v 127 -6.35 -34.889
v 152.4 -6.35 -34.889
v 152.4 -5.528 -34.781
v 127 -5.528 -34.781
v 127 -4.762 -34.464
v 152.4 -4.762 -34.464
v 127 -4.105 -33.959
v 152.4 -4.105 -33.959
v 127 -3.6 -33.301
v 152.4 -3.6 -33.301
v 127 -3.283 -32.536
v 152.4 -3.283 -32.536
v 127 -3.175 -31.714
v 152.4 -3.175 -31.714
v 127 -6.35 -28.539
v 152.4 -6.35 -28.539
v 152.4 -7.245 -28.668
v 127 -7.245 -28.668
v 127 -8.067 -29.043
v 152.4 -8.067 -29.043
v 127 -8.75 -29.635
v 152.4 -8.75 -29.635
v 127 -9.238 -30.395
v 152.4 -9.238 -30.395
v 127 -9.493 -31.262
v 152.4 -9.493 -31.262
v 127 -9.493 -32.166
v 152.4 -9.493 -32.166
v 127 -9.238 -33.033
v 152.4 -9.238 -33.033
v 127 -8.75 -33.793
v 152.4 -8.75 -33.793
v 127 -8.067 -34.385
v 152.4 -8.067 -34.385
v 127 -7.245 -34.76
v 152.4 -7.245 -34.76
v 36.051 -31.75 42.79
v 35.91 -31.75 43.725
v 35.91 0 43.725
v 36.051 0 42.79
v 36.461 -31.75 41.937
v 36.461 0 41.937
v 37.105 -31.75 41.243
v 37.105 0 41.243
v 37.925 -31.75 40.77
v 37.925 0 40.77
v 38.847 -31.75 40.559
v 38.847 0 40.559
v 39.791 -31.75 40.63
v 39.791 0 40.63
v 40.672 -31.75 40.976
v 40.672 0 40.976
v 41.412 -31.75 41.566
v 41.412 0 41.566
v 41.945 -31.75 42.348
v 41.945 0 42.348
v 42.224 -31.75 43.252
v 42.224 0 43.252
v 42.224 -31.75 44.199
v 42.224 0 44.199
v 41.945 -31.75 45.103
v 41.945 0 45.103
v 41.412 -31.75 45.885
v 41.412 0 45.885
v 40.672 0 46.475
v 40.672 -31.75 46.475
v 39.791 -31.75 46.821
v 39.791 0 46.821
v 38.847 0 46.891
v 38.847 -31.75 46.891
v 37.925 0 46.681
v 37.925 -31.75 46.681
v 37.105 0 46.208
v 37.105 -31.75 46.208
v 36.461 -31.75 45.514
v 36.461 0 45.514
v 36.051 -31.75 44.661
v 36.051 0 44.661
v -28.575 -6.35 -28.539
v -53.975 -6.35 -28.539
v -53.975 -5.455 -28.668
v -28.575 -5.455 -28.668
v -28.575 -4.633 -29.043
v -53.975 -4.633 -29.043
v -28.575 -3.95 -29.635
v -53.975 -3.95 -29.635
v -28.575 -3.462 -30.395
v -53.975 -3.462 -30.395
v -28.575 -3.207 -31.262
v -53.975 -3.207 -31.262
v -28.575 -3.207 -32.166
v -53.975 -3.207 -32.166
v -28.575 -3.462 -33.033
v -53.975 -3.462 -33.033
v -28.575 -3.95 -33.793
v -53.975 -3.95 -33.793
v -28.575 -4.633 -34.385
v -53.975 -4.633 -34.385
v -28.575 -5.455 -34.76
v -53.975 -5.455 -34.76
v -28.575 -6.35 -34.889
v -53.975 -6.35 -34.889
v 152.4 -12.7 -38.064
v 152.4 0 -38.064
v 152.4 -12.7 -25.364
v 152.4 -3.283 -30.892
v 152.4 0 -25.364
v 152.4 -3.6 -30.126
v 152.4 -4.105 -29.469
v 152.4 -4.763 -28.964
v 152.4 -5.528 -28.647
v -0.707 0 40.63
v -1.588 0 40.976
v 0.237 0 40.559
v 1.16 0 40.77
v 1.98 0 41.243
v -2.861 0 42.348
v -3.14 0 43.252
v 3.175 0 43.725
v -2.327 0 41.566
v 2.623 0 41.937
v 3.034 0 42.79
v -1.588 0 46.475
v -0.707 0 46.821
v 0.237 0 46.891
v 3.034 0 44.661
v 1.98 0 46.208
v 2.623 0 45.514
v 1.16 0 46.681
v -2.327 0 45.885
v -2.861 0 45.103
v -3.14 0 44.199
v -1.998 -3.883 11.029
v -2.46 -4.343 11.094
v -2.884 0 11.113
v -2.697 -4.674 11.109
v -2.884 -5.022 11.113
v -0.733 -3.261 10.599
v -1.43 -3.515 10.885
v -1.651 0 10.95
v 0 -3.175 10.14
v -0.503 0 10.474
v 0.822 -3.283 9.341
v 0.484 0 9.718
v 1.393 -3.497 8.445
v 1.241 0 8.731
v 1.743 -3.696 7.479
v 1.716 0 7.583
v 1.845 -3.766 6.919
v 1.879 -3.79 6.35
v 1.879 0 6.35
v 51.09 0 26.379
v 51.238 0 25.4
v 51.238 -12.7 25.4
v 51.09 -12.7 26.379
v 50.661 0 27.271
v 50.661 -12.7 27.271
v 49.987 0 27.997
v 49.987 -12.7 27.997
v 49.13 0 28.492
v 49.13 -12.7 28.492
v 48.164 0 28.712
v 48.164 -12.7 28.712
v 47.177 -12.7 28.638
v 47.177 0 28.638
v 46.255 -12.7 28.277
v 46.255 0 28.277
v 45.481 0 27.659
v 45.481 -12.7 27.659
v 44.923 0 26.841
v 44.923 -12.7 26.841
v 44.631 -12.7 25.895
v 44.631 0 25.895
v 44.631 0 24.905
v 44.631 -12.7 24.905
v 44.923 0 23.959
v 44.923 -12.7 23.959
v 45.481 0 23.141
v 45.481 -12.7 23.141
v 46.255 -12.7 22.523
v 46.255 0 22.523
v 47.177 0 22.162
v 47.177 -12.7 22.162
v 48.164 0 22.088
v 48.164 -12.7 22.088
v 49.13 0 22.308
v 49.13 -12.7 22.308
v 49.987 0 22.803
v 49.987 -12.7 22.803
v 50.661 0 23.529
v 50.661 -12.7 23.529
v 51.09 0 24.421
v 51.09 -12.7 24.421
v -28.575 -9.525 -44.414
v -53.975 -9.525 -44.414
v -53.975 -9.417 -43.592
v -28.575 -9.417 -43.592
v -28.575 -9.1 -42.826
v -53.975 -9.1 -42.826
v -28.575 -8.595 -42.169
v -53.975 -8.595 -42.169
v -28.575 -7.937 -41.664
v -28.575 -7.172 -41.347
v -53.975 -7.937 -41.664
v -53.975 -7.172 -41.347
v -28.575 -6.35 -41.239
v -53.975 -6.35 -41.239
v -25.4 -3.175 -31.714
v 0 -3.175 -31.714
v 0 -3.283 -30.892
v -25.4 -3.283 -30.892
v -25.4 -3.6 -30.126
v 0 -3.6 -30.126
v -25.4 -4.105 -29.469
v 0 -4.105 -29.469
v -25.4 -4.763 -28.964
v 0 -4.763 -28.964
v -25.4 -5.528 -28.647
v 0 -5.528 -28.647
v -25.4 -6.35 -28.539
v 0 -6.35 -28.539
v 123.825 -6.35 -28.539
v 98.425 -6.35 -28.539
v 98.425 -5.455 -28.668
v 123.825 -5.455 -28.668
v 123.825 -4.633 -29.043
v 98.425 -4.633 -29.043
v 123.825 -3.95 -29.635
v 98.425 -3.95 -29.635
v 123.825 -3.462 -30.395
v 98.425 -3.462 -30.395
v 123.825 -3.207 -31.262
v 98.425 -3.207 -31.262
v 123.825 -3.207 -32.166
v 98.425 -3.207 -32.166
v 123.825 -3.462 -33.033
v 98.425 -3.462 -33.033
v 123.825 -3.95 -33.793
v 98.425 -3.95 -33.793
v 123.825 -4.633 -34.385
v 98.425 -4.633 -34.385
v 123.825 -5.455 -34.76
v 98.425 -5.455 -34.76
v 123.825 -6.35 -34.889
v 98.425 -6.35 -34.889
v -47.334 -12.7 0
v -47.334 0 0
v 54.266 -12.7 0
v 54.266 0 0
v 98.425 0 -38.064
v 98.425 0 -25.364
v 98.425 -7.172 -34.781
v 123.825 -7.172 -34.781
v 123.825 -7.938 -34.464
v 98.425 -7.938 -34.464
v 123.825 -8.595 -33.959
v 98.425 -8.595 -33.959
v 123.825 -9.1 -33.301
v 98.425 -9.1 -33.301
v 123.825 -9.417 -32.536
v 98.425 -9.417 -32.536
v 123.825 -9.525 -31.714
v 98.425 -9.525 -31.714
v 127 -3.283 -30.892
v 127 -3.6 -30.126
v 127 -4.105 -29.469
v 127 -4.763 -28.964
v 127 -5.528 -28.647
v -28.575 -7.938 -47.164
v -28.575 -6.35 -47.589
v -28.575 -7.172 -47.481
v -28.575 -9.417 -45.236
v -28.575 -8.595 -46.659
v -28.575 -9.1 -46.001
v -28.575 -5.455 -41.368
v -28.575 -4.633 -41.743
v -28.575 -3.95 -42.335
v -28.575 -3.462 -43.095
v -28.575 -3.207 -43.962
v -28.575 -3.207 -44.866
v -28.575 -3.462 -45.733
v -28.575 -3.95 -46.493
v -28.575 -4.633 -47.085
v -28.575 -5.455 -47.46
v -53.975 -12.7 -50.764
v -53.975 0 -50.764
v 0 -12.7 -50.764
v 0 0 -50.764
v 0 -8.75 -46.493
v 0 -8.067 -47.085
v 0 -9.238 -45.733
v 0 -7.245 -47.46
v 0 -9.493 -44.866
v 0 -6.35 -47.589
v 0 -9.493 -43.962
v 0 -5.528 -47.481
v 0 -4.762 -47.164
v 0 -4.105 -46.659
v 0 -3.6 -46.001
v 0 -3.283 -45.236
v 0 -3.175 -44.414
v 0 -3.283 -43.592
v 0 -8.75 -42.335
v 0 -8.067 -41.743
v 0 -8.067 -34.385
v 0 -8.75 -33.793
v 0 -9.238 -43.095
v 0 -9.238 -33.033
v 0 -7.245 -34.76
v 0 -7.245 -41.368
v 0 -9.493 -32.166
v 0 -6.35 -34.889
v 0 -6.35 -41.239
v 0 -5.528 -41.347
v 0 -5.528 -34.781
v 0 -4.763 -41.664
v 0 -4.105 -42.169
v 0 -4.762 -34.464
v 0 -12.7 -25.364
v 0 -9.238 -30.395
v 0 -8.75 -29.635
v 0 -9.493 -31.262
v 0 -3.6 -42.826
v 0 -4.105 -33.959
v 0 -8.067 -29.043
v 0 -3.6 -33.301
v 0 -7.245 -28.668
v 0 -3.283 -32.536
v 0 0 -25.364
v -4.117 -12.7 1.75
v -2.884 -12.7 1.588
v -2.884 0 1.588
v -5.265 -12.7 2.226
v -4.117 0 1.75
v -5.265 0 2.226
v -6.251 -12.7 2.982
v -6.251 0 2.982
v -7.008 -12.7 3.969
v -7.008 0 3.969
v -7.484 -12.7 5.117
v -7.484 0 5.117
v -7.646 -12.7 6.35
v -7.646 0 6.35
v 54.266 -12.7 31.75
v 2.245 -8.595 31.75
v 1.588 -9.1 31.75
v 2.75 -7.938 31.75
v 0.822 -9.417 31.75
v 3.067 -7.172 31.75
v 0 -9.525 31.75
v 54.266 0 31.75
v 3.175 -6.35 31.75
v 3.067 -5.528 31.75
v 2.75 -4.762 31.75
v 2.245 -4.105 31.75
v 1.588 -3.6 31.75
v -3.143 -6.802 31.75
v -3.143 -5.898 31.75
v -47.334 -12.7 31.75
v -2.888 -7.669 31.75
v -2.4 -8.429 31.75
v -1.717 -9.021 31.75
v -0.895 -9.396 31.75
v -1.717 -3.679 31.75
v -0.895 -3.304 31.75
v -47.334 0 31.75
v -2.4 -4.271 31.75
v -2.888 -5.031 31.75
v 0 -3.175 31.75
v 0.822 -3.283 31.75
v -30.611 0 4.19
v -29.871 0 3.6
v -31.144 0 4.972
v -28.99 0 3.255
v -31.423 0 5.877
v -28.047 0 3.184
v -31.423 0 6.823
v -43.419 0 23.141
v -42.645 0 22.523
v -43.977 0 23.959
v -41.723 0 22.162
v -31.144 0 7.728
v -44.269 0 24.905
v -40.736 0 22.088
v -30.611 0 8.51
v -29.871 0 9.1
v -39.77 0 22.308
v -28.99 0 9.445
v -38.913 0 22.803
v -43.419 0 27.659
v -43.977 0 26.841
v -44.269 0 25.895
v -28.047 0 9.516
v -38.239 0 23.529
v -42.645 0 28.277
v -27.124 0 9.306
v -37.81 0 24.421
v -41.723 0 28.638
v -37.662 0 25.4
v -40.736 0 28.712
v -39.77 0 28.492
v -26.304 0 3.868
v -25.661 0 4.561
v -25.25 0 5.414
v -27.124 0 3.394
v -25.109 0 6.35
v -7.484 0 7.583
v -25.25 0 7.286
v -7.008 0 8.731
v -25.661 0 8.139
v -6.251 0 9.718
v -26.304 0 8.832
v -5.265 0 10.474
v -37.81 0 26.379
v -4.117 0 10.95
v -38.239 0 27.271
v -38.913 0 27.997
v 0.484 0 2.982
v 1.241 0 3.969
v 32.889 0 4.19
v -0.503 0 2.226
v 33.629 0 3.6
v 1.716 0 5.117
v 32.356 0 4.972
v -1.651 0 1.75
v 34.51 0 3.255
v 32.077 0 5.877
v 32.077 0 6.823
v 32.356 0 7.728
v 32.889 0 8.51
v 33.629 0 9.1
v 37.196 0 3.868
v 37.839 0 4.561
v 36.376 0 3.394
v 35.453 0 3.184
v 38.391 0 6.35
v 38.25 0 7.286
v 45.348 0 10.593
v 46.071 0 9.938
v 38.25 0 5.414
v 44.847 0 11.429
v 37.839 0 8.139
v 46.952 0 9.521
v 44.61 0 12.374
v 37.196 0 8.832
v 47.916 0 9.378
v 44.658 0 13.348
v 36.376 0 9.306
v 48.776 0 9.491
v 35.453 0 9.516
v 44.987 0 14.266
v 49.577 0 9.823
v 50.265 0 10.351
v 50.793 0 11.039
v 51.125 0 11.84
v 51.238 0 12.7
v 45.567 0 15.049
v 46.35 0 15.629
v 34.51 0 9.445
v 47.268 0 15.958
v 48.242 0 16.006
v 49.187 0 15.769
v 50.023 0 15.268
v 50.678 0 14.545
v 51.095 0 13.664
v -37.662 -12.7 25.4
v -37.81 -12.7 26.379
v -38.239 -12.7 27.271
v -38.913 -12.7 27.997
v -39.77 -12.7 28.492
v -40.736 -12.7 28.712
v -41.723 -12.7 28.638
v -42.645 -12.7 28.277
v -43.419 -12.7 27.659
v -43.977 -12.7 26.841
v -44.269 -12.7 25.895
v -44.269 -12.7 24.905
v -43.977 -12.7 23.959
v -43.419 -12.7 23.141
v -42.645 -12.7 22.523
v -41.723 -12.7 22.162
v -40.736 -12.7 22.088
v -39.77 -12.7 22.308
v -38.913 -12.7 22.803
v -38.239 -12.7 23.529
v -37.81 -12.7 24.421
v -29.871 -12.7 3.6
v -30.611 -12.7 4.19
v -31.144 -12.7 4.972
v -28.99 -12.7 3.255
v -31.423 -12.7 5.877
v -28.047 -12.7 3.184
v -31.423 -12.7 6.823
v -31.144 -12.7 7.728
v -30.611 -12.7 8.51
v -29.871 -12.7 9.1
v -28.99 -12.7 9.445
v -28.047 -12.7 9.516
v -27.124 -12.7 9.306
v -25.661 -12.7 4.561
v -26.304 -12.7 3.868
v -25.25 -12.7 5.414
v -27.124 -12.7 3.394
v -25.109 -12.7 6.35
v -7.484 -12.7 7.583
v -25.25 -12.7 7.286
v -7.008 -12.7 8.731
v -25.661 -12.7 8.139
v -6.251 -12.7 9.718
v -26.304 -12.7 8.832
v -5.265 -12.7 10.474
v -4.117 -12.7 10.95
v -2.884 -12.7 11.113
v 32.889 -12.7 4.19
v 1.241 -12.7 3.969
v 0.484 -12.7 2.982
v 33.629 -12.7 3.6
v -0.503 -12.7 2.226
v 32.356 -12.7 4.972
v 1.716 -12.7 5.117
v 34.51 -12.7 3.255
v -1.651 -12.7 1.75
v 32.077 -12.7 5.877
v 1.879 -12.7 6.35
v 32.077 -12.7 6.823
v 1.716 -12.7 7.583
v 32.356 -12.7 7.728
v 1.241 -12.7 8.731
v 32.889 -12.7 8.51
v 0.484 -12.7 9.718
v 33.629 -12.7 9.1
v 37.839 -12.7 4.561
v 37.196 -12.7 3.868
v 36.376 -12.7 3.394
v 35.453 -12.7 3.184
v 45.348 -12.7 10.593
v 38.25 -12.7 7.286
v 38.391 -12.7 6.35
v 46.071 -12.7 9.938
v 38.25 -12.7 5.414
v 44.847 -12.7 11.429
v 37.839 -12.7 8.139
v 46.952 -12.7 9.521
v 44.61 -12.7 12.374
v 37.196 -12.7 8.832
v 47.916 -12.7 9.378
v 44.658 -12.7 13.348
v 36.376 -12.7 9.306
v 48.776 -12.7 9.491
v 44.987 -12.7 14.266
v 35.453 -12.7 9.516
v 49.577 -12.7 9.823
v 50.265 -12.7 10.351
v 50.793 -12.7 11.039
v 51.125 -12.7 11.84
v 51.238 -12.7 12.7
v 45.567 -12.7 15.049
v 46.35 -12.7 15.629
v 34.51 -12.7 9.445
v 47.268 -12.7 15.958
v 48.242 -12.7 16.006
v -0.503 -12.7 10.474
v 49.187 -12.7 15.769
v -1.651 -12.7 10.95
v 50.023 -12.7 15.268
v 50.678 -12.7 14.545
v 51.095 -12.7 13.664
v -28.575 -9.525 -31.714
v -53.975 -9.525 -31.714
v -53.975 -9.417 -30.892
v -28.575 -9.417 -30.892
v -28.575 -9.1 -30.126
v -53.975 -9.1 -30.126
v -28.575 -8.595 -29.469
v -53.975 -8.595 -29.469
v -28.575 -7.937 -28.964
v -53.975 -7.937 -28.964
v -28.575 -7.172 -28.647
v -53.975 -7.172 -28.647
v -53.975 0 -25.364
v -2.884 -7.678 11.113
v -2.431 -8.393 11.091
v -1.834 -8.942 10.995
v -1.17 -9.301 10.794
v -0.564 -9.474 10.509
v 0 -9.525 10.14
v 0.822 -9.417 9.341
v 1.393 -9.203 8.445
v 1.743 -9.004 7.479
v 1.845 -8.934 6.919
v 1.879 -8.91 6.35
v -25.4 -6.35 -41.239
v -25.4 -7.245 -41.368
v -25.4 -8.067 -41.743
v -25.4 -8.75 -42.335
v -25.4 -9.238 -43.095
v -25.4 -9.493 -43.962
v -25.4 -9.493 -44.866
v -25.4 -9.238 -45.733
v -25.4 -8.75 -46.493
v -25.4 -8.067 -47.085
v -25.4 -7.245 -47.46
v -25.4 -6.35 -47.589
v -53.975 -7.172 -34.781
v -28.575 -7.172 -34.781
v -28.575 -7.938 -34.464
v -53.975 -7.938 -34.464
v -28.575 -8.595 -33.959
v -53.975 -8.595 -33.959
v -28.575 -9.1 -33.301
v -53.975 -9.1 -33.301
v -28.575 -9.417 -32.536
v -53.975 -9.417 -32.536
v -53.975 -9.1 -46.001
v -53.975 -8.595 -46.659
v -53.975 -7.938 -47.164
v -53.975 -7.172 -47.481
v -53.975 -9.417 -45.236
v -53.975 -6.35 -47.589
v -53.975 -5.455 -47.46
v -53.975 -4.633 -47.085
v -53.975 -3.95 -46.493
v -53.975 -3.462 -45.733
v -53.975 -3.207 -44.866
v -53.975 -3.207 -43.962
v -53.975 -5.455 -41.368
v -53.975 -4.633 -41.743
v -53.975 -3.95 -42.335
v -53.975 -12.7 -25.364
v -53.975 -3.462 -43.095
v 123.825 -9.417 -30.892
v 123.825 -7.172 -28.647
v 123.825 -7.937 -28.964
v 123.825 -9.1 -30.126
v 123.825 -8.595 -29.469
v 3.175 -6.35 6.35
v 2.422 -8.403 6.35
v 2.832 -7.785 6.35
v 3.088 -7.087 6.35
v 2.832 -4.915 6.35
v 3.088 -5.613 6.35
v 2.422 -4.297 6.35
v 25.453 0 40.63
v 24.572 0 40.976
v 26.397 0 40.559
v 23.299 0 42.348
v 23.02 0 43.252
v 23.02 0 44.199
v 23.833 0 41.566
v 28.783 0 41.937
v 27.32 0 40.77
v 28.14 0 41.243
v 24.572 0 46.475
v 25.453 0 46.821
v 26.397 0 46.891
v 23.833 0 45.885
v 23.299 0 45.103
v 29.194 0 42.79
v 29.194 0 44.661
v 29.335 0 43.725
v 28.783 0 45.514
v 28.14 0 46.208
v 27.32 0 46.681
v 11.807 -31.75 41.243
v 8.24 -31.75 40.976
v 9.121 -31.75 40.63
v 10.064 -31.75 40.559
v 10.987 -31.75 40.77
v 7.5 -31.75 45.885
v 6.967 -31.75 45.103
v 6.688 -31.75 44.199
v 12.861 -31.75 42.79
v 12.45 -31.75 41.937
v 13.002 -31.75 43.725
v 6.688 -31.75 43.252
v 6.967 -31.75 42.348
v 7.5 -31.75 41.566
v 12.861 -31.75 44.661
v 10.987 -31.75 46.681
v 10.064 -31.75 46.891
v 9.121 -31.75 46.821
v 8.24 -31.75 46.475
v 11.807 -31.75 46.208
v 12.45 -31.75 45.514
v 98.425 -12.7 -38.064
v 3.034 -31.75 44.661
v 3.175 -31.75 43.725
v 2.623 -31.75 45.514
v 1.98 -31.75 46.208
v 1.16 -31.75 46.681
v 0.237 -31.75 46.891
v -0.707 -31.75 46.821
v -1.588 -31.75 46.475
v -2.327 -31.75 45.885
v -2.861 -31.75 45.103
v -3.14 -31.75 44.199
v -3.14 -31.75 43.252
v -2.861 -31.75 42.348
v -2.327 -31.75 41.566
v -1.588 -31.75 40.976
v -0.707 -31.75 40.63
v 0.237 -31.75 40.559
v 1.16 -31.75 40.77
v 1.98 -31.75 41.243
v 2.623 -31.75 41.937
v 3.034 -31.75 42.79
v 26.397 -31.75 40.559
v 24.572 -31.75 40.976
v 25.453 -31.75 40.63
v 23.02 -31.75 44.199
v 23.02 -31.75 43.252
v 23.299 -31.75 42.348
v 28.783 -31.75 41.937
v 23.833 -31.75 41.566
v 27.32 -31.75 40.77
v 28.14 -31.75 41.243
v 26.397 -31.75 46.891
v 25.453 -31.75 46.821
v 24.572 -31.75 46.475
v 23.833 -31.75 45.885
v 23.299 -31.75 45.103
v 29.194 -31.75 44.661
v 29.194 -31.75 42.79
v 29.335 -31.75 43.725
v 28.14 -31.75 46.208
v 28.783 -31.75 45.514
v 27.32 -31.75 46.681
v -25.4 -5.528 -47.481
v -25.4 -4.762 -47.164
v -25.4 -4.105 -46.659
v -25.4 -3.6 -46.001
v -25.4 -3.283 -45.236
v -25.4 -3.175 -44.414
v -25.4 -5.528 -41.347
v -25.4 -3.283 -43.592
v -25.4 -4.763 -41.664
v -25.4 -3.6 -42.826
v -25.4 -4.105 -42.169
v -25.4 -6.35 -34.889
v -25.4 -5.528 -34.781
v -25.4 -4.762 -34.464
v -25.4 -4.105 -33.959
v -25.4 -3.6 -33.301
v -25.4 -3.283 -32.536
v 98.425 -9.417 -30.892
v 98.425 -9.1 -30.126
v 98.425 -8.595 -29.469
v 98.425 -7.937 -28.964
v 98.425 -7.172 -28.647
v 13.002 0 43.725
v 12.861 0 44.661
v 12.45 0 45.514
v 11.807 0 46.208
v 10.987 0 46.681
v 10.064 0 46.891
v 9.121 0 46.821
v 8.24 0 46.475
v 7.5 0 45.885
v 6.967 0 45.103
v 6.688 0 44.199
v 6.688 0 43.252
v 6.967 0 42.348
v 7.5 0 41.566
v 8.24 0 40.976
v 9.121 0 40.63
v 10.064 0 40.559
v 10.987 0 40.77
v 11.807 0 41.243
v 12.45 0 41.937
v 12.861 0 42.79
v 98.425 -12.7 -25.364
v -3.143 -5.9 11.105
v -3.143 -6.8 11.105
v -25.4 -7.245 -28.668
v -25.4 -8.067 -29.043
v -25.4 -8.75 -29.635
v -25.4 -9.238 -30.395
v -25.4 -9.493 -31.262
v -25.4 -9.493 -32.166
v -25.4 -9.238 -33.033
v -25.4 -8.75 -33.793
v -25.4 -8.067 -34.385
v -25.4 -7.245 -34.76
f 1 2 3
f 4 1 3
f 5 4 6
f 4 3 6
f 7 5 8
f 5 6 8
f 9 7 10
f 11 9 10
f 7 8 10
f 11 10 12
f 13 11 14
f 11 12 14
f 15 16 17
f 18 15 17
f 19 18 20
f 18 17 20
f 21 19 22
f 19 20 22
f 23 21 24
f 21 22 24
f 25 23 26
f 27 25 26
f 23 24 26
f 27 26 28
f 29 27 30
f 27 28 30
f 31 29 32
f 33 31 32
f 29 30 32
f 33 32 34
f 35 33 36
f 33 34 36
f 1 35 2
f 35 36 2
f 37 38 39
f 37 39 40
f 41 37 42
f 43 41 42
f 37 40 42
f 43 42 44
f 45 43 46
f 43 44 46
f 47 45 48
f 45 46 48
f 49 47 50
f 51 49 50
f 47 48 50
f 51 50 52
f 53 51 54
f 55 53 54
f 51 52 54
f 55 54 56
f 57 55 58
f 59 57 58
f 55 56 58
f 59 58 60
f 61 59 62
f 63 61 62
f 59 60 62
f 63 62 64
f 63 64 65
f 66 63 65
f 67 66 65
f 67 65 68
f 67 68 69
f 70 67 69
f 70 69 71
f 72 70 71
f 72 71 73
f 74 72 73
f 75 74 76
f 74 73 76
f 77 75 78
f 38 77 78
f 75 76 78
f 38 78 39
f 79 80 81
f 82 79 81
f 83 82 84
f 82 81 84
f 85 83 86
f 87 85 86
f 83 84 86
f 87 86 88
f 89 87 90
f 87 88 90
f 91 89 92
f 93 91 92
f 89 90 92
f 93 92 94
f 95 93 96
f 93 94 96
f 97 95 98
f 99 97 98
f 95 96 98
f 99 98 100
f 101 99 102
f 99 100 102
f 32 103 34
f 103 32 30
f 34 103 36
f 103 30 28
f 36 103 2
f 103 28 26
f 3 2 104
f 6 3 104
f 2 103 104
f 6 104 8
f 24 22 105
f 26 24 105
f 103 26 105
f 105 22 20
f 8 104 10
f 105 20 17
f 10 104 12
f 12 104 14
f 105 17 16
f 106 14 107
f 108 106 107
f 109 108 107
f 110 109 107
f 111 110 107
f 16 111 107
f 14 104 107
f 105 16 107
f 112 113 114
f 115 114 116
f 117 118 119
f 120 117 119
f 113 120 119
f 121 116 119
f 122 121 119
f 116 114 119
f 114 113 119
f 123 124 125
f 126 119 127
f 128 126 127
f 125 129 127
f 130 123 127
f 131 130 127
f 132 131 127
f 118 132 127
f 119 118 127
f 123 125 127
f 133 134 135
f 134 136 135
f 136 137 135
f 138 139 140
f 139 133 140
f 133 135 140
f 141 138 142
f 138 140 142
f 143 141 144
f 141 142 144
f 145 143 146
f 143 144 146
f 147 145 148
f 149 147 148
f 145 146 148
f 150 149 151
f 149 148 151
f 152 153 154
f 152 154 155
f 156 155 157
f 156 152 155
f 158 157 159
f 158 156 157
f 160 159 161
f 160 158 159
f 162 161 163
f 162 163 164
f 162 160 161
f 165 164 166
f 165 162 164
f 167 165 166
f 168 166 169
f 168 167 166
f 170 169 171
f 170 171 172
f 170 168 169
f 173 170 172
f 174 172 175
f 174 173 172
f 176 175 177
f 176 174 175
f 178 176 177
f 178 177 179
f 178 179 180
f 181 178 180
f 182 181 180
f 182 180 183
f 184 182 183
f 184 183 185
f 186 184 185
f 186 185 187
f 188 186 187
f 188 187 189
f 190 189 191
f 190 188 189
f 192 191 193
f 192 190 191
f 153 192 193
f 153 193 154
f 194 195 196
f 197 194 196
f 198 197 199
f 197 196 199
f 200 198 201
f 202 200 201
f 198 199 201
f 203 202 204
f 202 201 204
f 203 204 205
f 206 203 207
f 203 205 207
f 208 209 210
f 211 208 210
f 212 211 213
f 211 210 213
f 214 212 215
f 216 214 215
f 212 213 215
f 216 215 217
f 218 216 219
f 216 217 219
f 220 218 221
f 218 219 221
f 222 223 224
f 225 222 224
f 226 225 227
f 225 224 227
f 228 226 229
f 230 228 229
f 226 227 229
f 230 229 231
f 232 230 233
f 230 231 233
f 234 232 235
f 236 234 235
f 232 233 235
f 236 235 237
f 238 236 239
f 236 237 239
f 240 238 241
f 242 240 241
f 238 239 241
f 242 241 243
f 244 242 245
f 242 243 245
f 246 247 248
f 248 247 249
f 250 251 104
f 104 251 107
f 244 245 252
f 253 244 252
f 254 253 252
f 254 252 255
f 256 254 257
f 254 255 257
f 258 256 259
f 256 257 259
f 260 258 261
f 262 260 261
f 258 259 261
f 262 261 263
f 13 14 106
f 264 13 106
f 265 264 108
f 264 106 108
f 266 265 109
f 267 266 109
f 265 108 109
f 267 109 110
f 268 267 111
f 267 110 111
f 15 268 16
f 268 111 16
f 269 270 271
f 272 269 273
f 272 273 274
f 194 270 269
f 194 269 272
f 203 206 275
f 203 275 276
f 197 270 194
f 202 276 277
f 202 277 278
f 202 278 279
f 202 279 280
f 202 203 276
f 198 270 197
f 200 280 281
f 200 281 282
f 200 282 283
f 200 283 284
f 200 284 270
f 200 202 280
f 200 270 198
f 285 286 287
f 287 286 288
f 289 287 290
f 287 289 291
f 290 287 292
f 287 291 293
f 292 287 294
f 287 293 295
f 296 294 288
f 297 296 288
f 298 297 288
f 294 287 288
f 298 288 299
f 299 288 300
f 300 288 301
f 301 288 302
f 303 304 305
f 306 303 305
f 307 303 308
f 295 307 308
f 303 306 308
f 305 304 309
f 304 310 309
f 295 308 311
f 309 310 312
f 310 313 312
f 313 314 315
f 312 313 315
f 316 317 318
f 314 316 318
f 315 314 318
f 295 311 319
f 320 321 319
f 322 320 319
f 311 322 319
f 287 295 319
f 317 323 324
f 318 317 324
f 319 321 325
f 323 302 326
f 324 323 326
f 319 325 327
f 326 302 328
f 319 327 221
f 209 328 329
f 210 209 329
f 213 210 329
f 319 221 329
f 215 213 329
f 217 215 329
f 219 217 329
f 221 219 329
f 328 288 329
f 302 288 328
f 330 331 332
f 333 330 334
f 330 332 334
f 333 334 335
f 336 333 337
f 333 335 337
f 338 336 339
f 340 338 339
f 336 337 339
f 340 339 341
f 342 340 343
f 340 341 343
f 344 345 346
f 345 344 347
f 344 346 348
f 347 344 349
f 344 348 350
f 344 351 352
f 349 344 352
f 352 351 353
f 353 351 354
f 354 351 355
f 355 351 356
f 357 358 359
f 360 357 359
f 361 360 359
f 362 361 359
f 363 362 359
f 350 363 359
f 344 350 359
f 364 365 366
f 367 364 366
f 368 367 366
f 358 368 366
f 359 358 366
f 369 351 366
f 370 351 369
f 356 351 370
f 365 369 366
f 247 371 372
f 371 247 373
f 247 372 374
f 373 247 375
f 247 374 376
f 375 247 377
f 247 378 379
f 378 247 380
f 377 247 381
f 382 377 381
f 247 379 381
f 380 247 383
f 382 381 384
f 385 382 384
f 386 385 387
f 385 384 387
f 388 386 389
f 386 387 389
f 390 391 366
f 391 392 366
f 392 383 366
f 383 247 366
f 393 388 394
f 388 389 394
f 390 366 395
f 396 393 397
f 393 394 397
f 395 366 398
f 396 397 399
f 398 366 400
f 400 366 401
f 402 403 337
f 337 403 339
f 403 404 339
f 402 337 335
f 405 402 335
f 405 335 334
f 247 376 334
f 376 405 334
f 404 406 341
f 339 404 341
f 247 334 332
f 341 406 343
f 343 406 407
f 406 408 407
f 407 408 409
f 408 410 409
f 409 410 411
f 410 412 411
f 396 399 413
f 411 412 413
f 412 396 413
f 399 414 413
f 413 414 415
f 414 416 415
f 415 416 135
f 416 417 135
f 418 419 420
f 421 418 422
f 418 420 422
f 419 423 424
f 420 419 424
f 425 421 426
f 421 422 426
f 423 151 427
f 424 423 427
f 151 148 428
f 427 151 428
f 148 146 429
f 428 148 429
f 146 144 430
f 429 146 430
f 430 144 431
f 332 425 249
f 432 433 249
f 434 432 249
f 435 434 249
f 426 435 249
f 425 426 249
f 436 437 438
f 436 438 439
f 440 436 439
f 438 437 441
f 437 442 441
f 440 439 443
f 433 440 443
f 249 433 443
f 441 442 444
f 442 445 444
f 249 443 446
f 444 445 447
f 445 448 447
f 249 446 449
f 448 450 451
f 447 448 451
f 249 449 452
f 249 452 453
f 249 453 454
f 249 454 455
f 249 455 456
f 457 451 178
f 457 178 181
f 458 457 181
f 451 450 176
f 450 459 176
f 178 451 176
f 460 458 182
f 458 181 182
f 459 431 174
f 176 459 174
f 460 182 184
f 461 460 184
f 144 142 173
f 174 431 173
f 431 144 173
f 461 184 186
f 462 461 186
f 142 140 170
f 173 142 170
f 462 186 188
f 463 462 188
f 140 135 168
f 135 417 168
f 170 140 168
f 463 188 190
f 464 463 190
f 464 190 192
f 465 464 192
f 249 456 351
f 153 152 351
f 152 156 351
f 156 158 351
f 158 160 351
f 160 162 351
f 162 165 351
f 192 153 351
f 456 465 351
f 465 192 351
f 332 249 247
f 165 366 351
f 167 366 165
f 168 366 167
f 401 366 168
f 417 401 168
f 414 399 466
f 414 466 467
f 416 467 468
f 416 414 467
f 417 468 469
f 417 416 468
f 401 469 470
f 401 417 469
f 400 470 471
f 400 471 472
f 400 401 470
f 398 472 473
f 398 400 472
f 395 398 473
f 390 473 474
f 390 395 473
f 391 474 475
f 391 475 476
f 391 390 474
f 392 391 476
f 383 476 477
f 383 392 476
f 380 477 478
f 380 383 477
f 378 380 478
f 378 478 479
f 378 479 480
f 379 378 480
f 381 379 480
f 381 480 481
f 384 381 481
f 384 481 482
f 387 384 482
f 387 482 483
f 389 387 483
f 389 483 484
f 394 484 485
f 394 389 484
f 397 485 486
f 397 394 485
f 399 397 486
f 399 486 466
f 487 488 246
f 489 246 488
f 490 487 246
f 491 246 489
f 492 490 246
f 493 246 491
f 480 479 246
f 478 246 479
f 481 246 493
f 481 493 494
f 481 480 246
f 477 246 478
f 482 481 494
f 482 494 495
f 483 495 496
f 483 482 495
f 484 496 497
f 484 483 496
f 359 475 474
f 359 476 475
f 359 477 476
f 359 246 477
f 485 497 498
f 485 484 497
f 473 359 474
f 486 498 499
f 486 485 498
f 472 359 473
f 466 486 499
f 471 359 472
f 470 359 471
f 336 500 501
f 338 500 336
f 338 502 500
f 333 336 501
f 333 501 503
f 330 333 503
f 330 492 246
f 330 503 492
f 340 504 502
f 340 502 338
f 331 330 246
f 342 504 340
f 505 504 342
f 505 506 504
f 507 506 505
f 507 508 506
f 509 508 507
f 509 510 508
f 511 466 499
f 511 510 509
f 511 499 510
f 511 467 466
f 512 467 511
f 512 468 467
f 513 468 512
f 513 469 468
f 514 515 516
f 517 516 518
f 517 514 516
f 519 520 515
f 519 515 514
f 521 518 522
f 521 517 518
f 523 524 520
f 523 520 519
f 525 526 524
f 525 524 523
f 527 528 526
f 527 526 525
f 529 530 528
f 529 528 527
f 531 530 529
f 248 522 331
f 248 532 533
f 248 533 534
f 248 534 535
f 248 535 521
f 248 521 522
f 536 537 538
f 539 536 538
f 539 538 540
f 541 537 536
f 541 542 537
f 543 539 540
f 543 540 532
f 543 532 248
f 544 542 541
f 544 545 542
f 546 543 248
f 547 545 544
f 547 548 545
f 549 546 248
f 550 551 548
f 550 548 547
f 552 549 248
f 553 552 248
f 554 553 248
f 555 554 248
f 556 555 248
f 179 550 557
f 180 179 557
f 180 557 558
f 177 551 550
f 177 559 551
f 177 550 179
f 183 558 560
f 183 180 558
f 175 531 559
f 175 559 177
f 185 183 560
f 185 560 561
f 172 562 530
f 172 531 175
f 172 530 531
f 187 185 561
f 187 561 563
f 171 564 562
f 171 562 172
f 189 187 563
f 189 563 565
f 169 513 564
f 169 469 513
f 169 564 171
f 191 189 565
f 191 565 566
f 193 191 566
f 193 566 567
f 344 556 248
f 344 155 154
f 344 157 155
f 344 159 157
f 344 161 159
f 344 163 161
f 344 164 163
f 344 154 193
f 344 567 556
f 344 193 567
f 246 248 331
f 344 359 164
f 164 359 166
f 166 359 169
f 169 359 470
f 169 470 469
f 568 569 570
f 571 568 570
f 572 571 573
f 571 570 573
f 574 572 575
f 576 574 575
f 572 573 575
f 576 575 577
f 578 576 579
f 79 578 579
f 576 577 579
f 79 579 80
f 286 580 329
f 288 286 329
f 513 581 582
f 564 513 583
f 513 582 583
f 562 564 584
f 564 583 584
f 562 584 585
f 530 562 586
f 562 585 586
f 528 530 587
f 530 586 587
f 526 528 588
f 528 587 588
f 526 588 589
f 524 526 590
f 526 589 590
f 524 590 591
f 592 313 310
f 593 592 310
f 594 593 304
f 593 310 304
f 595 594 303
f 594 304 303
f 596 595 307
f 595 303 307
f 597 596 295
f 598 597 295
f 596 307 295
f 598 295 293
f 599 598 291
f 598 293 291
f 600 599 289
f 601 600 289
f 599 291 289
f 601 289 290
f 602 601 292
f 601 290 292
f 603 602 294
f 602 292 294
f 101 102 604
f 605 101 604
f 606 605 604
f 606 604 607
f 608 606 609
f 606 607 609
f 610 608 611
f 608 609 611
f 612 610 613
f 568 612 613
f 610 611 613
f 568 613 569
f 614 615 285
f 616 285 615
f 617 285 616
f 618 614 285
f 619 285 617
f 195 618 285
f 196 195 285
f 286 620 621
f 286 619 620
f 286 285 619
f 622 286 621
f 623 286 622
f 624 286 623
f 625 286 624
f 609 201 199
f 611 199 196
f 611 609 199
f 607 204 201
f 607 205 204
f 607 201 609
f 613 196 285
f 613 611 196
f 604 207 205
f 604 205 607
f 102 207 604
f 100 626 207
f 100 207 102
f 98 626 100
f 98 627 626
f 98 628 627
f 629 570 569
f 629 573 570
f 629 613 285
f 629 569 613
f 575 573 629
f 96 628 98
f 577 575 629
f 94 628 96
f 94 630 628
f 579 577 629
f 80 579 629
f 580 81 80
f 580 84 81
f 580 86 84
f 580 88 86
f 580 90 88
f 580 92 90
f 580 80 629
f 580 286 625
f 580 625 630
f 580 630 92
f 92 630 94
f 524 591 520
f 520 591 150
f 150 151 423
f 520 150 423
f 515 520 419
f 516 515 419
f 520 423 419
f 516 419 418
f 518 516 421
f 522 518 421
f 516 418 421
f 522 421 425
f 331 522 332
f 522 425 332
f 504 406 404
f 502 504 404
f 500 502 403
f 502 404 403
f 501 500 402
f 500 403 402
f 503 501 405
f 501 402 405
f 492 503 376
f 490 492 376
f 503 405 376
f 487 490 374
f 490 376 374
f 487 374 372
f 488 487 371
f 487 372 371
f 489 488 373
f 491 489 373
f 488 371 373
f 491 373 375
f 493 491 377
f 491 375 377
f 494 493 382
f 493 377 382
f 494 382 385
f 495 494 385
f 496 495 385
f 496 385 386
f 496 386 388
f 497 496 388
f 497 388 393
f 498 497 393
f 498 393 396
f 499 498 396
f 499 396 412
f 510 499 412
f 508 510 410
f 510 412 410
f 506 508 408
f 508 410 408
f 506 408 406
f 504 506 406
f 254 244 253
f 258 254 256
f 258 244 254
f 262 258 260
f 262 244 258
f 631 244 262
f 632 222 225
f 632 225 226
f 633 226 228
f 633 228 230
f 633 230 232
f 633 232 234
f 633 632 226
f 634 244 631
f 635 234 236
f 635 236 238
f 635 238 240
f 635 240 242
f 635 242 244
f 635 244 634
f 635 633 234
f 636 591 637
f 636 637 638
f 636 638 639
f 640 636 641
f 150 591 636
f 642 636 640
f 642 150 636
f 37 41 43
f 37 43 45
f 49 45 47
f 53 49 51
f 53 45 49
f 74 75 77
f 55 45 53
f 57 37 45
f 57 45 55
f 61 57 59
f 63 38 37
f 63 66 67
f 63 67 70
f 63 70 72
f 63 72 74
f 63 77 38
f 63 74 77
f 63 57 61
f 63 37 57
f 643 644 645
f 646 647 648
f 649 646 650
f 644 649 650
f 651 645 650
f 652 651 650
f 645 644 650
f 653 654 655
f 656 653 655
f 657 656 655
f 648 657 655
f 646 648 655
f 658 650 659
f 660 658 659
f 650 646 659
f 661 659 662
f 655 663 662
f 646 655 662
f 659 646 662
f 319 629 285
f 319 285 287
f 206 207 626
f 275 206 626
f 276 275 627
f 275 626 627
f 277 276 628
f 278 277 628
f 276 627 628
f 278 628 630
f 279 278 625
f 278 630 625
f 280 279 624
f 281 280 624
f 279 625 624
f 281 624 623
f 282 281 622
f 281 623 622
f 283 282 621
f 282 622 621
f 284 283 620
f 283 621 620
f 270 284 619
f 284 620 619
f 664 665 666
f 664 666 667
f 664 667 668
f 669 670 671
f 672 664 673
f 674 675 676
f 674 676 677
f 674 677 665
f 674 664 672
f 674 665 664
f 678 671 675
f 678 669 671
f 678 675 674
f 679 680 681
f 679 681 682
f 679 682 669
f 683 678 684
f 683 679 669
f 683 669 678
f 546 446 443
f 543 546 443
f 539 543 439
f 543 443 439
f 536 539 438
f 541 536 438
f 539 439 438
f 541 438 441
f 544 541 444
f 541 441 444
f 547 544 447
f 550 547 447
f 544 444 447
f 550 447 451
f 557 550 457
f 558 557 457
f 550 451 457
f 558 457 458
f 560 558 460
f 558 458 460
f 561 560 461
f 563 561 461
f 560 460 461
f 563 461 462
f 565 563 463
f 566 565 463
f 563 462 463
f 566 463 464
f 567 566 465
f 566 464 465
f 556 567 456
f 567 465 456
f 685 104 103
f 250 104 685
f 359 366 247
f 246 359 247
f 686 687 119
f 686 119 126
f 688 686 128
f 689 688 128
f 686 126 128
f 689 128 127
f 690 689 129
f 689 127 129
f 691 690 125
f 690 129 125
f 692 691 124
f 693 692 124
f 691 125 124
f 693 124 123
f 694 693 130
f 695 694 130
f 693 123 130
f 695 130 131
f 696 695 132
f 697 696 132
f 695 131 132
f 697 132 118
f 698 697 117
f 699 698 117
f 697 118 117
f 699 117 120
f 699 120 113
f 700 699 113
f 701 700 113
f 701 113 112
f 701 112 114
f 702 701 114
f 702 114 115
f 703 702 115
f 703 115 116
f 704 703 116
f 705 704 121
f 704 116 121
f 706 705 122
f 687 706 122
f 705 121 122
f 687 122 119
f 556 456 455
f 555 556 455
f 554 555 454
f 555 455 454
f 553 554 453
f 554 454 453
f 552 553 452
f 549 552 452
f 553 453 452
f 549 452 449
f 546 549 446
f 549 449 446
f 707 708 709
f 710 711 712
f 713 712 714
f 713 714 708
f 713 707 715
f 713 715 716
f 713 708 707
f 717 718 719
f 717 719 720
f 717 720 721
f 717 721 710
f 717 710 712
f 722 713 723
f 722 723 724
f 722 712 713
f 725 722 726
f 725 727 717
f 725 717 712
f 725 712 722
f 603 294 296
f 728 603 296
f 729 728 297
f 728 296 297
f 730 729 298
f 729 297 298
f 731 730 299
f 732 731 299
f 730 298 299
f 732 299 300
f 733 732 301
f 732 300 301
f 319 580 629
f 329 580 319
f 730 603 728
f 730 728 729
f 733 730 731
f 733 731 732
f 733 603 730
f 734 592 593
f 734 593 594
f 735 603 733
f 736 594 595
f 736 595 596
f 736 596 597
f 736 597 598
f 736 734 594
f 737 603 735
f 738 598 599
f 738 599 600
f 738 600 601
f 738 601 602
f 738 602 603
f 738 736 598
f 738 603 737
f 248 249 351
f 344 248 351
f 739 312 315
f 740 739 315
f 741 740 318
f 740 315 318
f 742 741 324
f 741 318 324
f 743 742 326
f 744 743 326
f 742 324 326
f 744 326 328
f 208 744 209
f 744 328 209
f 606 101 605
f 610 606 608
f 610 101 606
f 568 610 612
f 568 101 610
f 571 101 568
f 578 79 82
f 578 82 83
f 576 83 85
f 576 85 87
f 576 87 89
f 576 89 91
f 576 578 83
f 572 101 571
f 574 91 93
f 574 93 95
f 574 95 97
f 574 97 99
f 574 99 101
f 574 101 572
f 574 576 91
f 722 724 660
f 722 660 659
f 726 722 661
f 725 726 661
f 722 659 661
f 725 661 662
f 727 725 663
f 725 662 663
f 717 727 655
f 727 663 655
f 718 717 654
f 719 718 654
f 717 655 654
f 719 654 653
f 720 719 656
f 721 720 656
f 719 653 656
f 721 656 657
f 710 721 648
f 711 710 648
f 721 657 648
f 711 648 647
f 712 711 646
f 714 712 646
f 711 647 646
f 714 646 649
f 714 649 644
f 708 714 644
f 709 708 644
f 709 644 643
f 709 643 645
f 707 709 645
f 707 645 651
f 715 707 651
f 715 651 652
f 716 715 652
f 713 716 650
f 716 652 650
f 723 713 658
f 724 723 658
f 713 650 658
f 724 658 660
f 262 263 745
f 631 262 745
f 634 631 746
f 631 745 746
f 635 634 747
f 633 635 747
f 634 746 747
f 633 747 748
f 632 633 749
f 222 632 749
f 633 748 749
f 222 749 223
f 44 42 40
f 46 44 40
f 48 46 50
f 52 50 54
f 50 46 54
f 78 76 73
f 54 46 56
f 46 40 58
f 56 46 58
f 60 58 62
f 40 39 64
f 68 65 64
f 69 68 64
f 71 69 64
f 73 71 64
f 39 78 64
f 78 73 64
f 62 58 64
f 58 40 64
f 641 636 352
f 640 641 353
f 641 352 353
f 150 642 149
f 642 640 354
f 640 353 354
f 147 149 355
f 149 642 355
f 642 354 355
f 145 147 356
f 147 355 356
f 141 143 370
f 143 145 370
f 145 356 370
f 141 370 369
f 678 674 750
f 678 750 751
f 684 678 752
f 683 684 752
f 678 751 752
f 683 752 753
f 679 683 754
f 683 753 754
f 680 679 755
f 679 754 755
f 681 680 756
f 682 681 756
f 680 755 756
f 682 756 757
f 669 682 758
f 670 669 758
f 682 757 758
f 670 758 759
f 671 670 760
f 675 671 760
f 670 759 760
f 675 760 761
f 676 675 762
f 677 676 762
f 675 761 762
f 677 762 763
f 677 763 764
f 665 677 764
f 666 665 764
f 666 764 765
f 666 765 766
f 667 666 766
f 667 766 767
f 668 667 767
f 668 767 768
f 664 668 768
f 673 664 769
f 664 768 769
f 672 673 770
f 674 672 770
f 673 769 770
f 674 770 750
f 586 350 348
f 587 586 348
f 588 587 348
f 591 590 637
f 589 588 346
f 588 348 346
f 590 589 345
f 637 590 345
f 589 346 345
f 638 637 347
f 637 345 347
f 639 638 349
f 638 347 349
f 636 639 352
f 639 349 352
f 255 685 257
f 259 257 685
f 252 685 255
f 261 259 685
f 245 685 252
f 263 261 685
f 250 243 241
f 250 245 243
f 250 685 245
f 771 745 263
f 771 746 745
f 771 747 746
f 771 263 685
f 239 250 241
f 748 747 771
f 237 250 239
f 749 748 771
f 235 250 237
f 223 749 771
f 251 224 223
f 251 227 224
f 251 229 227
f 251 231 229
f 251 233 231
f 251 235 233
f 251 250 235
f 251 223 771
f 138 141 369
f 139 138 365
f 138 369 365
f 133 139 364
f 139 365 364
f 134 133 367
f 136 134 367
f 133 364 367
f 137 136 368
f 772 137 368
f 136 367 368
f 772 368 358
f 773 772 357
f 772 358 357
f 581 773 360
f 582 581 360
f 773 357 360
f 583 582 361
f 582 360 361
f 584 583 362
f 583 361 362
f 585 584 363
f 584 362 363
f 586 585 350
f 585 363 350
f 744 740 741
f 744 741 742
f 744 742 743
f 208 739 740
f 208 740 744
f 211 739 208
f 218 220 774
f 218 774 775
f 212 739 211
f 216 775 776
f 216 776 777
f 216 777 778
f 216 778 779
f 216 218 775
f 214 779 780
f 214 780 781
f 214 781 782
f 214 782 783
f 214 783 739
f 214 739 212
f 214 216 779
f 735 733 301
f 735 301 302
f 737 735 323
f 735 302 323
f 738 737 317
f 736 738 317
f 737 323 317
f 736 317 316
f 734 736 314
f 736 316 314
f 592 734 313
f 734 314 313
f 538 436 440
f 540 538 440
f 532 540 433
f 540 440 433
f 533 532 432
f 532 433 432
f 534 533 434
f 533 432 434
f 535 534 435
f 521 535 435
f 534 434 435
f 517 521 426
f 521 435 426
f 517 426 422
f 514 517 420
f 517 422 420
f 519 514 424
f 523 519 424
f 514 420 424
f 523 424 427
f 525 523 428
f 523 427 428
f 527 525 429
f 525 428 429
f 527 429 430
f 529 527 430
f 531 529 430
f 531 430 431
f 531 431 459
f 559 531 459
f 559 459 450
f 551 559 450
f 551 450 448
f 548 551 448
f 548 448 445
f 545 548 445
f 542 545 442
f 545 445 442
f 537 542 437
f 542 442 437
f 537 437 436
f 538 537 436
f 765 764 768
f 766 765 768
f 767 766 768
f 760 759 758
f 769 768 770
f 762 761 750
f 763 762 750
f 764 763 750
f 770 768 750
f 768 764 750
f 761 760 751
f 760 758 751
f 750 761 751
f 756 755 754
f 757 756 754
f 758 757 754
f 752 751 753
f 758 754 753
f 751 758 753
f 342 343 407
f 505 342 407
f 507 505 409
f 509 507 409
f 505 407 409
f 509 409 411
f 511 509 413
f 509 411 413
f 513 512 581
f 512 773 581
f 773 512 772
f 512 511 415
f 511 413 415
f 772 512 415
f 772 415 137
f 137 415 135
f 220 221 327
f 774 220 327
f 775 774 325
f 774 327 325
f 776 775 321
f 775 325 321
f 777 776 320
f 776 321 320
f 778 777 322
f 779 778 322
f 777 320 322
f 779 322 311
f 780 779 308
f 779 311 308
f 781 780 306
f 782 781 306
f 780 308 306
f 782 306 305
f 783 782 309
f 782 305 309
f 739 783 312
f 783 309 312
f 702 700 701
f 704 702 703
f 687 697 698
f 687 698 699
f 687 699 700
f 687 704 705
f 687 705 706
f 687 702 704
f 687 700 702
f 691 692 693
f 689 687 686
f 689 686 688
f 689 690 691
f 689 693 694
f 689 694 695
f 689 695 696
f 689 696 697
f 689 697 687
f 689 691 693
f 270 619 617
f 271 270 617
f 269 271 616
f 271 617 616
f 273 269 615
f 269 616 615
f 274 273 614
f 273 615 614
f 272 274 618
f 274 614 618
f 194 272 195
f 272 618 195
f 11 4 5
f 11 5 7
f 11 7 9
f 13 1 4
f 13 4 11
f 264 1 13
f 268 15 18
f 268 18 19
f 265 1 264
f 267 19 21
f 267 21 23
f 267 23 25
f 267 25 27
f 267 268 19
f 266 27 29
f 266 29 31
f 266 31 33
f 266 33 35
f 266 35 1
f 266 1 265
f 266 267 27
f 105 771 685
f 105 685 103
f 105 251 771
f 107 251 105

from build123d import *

# Parameters (mm, degrees)
F0_R      = 3.3217197239
F0_W      = 6.35
F0_H      = 6.35
F1_DEPTH  = 12.7
F0_W_2    = 53.975
F0_H_2    = 25.4
F3_DEPTH  = 25.4
F5_DEPTH  = 25.4
F7_DEPTH  = 31.75
F9_DEPTH  = 25.4
F11_W     = 53.975
F11_H     = 12.7
F12_DEPTH = 25.4


with BuildPart() as f1:
    # F0 (on Front) → F1 (new body)
    with BuildSketch(Plane.XZ):
        with BuildLine():
            Line((-2.8839016237, 31.75), (-47.3339016237, 31.75))
            Line((-47.3339016237, 31.75), (-47.3339016237, 6.35))
            Line((-47.3339016237, 6.35), (-31.4589016237, 6.35))
            ThreePointArc((-31.4589016237, 6.35), (-28.2839016237, 9.525), (-25.1089016237, 6.35))
            Line((-25.1089016237, 6.35), (-7.6464016237, 6.35))
            ThreePointArc((-7.6464016237, 6.35), (-6.2514976691, 9.7175960454), (-2.8839016237, 11.1125))
            Line((-2.8839016237, 11.1125), (-2.8839016237, 31.75))
        make_face()
        with Locations((-40.9839016237, 25.4)):
            Circle(F0_R, mode=Mode.SUBTRACT)
        with BuildLine():
            Line((54.2660983763, 31.75), (-2.8839016237, 31.75))
            Line((-2.8839016237, 31.75), (-2.8839016237, 11.1125))
            ThreePointArc((-2.8839016237, 11.1125), (0.4836944217, 9.7175960454), (1.8785983763, 6.35))
            Line((1.8785983763, 6.35), (32.0410983763, 6.35))
            ThreePointArc((32.0410983763, 6.35), (35.2160983763, 9.525), (38.3910983763, 6.35))
            Line((38.3910983763, 6.35), (47.9160983763, 6.35))
            Line((47.9160983763, 6.35), (54.2660983763, 6.35))
            Line((54.2660983763, 6.35), (54.2660983763, 31.75))
        make_face()
        with BuildLine():
            ThreePointArc((51.2378181002, 12.7), (50.2649089182, 10.351189458), (47.9160983763, 9.3782802761))
            ThreePointArc((47.9160983763, 9.3782802761), (45.5672878343, 15.048810542), (51.2378181002, 12.7))
        make_face(mode=Mode.SUBTRACT)
        with Locations((47.9160983763, 25.4)):
            Circle(F0_R, mode=Mode.SUBTRACT)
        with BuildLine():
            Line((-31.4589016237, 6.35), (-47.3339016237, 6.35))
            Line((-47.3339016237, 6.35), (-47.3339016237, 0))
            Line((-47.3339016237, 0), (-2.8839016237, 0))
            Line((-2.8839016237, 0), (-2.8839016237, 1.5875))
            ThreePointArc((-2.8839016237, 1.5875), (-6.2514976691, 2.9824039546), (-7.6464016237, 6.35))
            Line((-7.6464016237, 6.35), (-25.1089016237, 6.35))
            ThreePointArc((-25.1089016237, 6.35), (-28.2839016237, 3.175), (-31.4589016237, 6.35))
        make_face()
        with Locations((51.0910983763, 3.175)):
            Rectangle(F0_W, F0_H)
        with BuildLine():
            Line((32.0410983763, 6.35), (1.8785983763, 6.35))
            ThreePointArc((1.8785983763, 6.35), (0.4836944217, 2.9824039546), (-2.8839016237, 1.5875))
            Line((-2.8839016237, 1.5875), (-2.8839016237, 0))
            Line((-2.8839016237, 0), (47.9160983763, 0))
            Line((47.9160983763, 0), (47.9160983763, 6.35))
            Line((47.9160983763, 6.35), (38.3910983763, 6.35))
            ThreePointArc((38.3910983763, 6.35), (35.2160983763, 3.175), (32.0410983763, 6.35))
        make_face()
    extrude(amount=F1_DEPTH)

    # F8 (on face) → F9 (cut)
    with BuildSketch(Plane.XY.offset(31.75)):
        with BuildLine():
            ThreePointArc((3.175, -6.35), (2.2450640303, -4.1049359697), (0, -3.175))
            Line((0, -3.175), (0, -9.525))
            ThreePointArc((0, -9.525), (2.2450640303, -8.5950640303), (3.175, -6.35))
        make_face()
        with BuildLine():
            Line((0, -9.525), (0, -3.175))
            ThreePointArc((0, -3.175), (-3.175, -6.35), (0, -9.525))
        make_face()
    extrude(amount=-F9_DEPTH, mode=Mode.SUBTRACT)


with BuildPart() as f1b:
    # F0 (on Front) → F1, piece 2 (new body)
    with BuildSketch(Plane.XZ):
        with Locations((-26.9875, -38.0639199495)):
            Rectangle(F0_W_2, F0_H_2)
    extrude(amount=F1_DEPTH)

    # F2 (on face) → F3 (cut)
    with BuildSketch(Plane(origin=(-53.975, 0, 0), x_dir=(0, -1, 0), z_dir=(-1, 0, 0))):
        with BuildLine():
            ThreePointArc((9.525, -31.7139199495), (8.5950640303, -29.4688559193), (6.35, -28.5389199495))
            Line((6.35, -28.5389199495), (6.35, -34.8889199495))
            ThreePointArc((6.35, -34.8889199495), (8.5950640303, -33.9589839798), (9.525, -31.7139199495))
        make_face()
        with BuildLine():
            ThreePointArc((9.525, -44.4139199495), (8.5950640303, -42.1688559193), (6.35, -41.2389199495))
            Line((6.35, -41.2389199495), (6.35, -47.5889199495))
            ThreePointArc((6.35, -47.5889199495), (8.5950640303, -46.6589839798), (9.525, -44.4139199495))
        make_face()
        with BuildLine():
            Line((6.35, -47.5889199495), (6.35, -41.2389199495))
            ThreePointArc((6.35, -41.2389199495), (3.175, -44.4139199495), (6.35, -47.5889199495))
        make_face()
        with BuildLine():
            Line((6.35, -34.8889199495), (6.35, -28.5389199495))
            ThreePointArc((6.35, -28.5389199495), (3.175, -31.7139199495), (6.35, -34.8889199495))
        make_face()
    extrude(amount=-F3_DEPTH, mode=Mode.SUBTRACT)

    # F4 (on face) → F5 (cut)
    with BuildSketch(Plane.YZ):
        with BuildLine():
            ThreePointArc((-3.175, -31.7139199495), (-4.1049359697, -29.4688559193), (-6.35, -28.5389199495))
            Line((-6.35, -28.5389199495), (-6.35, -34.8889199495))
            ThreePointArc((-6.35, -34.8889199495), (-4.1049359697, -33.9589839798), (-3.175, -31.7139199495))
        make_face()
        with BuildLine():
            ThreePointArc((-3.175, -44.4139199495), (-4.1049359697, -42.1688559193), (-6.35, -41.2389199495))
            Line((-6.35, -41.2389199495), (-6.35, -47.5889199495))
            ThreePointArc((-6.35, -47.5889199495), (-4.1049359697, -46.6589839798), (-3.175, -44.4139199495))
        make_face()
        with BuildLine():
            Line((-6.35, -47.5889199495), (-6.35, -41.2389199495))
            ThreePointArc((-6.35, -41.2389199495), (-9.525, -44.4139199495), (-6.35, -47.5889199495))
        make_face()
        with BuildLine():
            Line((-6.35, -34.8889199495), (-6.35, -28.5389199495))
            ThreePointArc((-6.35, -28.5389199495), (-9.525, -31.7139199495), (-6.35, -34.8889199495))
        make_face()
    extrude(amount=-F5_DEPTH, mode=Mode.SUBTRACT)


with BuildPart() as f7:
    # F6 (on Front) → F7 (new body)
    with BuildSketch(Plane.XZ):
        with BuildLine():
            Line((35.9097101808, 43.7253676355), (42.2597101808, 43.7253676355))
            ThreePointArc((42.2597101808, 43.7253676355), (39.0847101808, 46.9003676355), (35.9097101808, 43.7253676355))
        make_face()
        with BuildLine():
            ThreePointArc((35.9097101808, 43.7253676355), (39.0847101808, 40.5503676355), (42.2597101808, 43.7253676355))
            Line((42.2597101808, 43.7253676355), (35.9097101808, 43.7253676355))
        make_face()
    extrude(amount=F7_DEPTH)


with BuildPart() as f7b:
    # F6 (on Front) → F7, piece 2 (new body)
    with BuildSketch(Plane.XZ):
        with BuildLine():
            ThreePointArc((-3.175, 43.7253676355), (0, 40.5503676355), (3.175, 43.7253676355))
            Line((3.175, 43.7253676355), (-3.175, 43.7253676355))
        make_face()
        with BuildLine():
            Line((-3.175, 43.7253676355), (3.175, 43.7253676355))
            ThreePointArc((3.175, 43.7253676355), (0, 46.9003676355), (-3.175, 43.7253676355))
        make_face()
    extrude(amount=F7_DEPTH)


with BuildPart() as f7c:
    # F6 (on Front) → F7, piece 3 (new body)
    with BuildSketch(Plane.XZ):
        with BuildLine():
            ThreePointArc((6.6520801827, 43.7253676355), (9.8270801827, 40.5503676355), (13.0020801827, 43.7253676355))
            Line((13.0020801827, 43.7253676355), (6.6520801827, 43.7253676355))
        make_face()
        with BuildLine():
            Line((6.6520801827, 43.7253676355), (13.0020801827, 43.7253676355))
            ThreePointArc((13.0020801827, 43.7253676355), (9.8270801827, 46.9003676355), (6.6520801827, 43.7253676355))
        make_face()
    extrude(amount=F7_DEPTH)


with BuildPart() as f7d:
    # F6 (on Front) → F7, piece 4 (new body)
    with BuildSketch(Plane.XZ):
        with BuildLine():
            ThreePointArc((22.9849756777, 43.7253676355), (26.1599756777, 40.5503676355), (29.3349756777, 43.7253676355))
            Line((29.3349756777, 43.7253676355), (22.9849756777, 43.7253676355))
        make_face()
        with BuildLine():
            Line((22.9849756777, 43.7253676355), (29.3349756777, 43.7253676355))
            ThreePointArc((29.3349756777, 43.7253676355), (26.1599756777, 46.9003676355), (22.9849756777, 43.7253676355))
        make_face()
    extrude(amount=F7_DEPTH)


with BuildPart() as f10_1:
    # F10: copy of F1b
    add(f1b.part.moved(Location((152.4, 0, 0))))

    # F11 (on face) → F12 (cut)
    with BuildSketch(Plane(origin=(0, 0, 0), x_dir=(-1, 0, 0), z_dir=(0, 1, 0))):
        with Locations((-125.4125, -44.4139199495)):
            Rectangle(F11_W, F11_H)
    extrude(amount=-F12_DEPTH, mode=Mode.SUBTRACT)


solid = Compound([f1.part, f1b.part, f7.part, f7b.part, f7c.part, f7d.part, f10_1.part])
